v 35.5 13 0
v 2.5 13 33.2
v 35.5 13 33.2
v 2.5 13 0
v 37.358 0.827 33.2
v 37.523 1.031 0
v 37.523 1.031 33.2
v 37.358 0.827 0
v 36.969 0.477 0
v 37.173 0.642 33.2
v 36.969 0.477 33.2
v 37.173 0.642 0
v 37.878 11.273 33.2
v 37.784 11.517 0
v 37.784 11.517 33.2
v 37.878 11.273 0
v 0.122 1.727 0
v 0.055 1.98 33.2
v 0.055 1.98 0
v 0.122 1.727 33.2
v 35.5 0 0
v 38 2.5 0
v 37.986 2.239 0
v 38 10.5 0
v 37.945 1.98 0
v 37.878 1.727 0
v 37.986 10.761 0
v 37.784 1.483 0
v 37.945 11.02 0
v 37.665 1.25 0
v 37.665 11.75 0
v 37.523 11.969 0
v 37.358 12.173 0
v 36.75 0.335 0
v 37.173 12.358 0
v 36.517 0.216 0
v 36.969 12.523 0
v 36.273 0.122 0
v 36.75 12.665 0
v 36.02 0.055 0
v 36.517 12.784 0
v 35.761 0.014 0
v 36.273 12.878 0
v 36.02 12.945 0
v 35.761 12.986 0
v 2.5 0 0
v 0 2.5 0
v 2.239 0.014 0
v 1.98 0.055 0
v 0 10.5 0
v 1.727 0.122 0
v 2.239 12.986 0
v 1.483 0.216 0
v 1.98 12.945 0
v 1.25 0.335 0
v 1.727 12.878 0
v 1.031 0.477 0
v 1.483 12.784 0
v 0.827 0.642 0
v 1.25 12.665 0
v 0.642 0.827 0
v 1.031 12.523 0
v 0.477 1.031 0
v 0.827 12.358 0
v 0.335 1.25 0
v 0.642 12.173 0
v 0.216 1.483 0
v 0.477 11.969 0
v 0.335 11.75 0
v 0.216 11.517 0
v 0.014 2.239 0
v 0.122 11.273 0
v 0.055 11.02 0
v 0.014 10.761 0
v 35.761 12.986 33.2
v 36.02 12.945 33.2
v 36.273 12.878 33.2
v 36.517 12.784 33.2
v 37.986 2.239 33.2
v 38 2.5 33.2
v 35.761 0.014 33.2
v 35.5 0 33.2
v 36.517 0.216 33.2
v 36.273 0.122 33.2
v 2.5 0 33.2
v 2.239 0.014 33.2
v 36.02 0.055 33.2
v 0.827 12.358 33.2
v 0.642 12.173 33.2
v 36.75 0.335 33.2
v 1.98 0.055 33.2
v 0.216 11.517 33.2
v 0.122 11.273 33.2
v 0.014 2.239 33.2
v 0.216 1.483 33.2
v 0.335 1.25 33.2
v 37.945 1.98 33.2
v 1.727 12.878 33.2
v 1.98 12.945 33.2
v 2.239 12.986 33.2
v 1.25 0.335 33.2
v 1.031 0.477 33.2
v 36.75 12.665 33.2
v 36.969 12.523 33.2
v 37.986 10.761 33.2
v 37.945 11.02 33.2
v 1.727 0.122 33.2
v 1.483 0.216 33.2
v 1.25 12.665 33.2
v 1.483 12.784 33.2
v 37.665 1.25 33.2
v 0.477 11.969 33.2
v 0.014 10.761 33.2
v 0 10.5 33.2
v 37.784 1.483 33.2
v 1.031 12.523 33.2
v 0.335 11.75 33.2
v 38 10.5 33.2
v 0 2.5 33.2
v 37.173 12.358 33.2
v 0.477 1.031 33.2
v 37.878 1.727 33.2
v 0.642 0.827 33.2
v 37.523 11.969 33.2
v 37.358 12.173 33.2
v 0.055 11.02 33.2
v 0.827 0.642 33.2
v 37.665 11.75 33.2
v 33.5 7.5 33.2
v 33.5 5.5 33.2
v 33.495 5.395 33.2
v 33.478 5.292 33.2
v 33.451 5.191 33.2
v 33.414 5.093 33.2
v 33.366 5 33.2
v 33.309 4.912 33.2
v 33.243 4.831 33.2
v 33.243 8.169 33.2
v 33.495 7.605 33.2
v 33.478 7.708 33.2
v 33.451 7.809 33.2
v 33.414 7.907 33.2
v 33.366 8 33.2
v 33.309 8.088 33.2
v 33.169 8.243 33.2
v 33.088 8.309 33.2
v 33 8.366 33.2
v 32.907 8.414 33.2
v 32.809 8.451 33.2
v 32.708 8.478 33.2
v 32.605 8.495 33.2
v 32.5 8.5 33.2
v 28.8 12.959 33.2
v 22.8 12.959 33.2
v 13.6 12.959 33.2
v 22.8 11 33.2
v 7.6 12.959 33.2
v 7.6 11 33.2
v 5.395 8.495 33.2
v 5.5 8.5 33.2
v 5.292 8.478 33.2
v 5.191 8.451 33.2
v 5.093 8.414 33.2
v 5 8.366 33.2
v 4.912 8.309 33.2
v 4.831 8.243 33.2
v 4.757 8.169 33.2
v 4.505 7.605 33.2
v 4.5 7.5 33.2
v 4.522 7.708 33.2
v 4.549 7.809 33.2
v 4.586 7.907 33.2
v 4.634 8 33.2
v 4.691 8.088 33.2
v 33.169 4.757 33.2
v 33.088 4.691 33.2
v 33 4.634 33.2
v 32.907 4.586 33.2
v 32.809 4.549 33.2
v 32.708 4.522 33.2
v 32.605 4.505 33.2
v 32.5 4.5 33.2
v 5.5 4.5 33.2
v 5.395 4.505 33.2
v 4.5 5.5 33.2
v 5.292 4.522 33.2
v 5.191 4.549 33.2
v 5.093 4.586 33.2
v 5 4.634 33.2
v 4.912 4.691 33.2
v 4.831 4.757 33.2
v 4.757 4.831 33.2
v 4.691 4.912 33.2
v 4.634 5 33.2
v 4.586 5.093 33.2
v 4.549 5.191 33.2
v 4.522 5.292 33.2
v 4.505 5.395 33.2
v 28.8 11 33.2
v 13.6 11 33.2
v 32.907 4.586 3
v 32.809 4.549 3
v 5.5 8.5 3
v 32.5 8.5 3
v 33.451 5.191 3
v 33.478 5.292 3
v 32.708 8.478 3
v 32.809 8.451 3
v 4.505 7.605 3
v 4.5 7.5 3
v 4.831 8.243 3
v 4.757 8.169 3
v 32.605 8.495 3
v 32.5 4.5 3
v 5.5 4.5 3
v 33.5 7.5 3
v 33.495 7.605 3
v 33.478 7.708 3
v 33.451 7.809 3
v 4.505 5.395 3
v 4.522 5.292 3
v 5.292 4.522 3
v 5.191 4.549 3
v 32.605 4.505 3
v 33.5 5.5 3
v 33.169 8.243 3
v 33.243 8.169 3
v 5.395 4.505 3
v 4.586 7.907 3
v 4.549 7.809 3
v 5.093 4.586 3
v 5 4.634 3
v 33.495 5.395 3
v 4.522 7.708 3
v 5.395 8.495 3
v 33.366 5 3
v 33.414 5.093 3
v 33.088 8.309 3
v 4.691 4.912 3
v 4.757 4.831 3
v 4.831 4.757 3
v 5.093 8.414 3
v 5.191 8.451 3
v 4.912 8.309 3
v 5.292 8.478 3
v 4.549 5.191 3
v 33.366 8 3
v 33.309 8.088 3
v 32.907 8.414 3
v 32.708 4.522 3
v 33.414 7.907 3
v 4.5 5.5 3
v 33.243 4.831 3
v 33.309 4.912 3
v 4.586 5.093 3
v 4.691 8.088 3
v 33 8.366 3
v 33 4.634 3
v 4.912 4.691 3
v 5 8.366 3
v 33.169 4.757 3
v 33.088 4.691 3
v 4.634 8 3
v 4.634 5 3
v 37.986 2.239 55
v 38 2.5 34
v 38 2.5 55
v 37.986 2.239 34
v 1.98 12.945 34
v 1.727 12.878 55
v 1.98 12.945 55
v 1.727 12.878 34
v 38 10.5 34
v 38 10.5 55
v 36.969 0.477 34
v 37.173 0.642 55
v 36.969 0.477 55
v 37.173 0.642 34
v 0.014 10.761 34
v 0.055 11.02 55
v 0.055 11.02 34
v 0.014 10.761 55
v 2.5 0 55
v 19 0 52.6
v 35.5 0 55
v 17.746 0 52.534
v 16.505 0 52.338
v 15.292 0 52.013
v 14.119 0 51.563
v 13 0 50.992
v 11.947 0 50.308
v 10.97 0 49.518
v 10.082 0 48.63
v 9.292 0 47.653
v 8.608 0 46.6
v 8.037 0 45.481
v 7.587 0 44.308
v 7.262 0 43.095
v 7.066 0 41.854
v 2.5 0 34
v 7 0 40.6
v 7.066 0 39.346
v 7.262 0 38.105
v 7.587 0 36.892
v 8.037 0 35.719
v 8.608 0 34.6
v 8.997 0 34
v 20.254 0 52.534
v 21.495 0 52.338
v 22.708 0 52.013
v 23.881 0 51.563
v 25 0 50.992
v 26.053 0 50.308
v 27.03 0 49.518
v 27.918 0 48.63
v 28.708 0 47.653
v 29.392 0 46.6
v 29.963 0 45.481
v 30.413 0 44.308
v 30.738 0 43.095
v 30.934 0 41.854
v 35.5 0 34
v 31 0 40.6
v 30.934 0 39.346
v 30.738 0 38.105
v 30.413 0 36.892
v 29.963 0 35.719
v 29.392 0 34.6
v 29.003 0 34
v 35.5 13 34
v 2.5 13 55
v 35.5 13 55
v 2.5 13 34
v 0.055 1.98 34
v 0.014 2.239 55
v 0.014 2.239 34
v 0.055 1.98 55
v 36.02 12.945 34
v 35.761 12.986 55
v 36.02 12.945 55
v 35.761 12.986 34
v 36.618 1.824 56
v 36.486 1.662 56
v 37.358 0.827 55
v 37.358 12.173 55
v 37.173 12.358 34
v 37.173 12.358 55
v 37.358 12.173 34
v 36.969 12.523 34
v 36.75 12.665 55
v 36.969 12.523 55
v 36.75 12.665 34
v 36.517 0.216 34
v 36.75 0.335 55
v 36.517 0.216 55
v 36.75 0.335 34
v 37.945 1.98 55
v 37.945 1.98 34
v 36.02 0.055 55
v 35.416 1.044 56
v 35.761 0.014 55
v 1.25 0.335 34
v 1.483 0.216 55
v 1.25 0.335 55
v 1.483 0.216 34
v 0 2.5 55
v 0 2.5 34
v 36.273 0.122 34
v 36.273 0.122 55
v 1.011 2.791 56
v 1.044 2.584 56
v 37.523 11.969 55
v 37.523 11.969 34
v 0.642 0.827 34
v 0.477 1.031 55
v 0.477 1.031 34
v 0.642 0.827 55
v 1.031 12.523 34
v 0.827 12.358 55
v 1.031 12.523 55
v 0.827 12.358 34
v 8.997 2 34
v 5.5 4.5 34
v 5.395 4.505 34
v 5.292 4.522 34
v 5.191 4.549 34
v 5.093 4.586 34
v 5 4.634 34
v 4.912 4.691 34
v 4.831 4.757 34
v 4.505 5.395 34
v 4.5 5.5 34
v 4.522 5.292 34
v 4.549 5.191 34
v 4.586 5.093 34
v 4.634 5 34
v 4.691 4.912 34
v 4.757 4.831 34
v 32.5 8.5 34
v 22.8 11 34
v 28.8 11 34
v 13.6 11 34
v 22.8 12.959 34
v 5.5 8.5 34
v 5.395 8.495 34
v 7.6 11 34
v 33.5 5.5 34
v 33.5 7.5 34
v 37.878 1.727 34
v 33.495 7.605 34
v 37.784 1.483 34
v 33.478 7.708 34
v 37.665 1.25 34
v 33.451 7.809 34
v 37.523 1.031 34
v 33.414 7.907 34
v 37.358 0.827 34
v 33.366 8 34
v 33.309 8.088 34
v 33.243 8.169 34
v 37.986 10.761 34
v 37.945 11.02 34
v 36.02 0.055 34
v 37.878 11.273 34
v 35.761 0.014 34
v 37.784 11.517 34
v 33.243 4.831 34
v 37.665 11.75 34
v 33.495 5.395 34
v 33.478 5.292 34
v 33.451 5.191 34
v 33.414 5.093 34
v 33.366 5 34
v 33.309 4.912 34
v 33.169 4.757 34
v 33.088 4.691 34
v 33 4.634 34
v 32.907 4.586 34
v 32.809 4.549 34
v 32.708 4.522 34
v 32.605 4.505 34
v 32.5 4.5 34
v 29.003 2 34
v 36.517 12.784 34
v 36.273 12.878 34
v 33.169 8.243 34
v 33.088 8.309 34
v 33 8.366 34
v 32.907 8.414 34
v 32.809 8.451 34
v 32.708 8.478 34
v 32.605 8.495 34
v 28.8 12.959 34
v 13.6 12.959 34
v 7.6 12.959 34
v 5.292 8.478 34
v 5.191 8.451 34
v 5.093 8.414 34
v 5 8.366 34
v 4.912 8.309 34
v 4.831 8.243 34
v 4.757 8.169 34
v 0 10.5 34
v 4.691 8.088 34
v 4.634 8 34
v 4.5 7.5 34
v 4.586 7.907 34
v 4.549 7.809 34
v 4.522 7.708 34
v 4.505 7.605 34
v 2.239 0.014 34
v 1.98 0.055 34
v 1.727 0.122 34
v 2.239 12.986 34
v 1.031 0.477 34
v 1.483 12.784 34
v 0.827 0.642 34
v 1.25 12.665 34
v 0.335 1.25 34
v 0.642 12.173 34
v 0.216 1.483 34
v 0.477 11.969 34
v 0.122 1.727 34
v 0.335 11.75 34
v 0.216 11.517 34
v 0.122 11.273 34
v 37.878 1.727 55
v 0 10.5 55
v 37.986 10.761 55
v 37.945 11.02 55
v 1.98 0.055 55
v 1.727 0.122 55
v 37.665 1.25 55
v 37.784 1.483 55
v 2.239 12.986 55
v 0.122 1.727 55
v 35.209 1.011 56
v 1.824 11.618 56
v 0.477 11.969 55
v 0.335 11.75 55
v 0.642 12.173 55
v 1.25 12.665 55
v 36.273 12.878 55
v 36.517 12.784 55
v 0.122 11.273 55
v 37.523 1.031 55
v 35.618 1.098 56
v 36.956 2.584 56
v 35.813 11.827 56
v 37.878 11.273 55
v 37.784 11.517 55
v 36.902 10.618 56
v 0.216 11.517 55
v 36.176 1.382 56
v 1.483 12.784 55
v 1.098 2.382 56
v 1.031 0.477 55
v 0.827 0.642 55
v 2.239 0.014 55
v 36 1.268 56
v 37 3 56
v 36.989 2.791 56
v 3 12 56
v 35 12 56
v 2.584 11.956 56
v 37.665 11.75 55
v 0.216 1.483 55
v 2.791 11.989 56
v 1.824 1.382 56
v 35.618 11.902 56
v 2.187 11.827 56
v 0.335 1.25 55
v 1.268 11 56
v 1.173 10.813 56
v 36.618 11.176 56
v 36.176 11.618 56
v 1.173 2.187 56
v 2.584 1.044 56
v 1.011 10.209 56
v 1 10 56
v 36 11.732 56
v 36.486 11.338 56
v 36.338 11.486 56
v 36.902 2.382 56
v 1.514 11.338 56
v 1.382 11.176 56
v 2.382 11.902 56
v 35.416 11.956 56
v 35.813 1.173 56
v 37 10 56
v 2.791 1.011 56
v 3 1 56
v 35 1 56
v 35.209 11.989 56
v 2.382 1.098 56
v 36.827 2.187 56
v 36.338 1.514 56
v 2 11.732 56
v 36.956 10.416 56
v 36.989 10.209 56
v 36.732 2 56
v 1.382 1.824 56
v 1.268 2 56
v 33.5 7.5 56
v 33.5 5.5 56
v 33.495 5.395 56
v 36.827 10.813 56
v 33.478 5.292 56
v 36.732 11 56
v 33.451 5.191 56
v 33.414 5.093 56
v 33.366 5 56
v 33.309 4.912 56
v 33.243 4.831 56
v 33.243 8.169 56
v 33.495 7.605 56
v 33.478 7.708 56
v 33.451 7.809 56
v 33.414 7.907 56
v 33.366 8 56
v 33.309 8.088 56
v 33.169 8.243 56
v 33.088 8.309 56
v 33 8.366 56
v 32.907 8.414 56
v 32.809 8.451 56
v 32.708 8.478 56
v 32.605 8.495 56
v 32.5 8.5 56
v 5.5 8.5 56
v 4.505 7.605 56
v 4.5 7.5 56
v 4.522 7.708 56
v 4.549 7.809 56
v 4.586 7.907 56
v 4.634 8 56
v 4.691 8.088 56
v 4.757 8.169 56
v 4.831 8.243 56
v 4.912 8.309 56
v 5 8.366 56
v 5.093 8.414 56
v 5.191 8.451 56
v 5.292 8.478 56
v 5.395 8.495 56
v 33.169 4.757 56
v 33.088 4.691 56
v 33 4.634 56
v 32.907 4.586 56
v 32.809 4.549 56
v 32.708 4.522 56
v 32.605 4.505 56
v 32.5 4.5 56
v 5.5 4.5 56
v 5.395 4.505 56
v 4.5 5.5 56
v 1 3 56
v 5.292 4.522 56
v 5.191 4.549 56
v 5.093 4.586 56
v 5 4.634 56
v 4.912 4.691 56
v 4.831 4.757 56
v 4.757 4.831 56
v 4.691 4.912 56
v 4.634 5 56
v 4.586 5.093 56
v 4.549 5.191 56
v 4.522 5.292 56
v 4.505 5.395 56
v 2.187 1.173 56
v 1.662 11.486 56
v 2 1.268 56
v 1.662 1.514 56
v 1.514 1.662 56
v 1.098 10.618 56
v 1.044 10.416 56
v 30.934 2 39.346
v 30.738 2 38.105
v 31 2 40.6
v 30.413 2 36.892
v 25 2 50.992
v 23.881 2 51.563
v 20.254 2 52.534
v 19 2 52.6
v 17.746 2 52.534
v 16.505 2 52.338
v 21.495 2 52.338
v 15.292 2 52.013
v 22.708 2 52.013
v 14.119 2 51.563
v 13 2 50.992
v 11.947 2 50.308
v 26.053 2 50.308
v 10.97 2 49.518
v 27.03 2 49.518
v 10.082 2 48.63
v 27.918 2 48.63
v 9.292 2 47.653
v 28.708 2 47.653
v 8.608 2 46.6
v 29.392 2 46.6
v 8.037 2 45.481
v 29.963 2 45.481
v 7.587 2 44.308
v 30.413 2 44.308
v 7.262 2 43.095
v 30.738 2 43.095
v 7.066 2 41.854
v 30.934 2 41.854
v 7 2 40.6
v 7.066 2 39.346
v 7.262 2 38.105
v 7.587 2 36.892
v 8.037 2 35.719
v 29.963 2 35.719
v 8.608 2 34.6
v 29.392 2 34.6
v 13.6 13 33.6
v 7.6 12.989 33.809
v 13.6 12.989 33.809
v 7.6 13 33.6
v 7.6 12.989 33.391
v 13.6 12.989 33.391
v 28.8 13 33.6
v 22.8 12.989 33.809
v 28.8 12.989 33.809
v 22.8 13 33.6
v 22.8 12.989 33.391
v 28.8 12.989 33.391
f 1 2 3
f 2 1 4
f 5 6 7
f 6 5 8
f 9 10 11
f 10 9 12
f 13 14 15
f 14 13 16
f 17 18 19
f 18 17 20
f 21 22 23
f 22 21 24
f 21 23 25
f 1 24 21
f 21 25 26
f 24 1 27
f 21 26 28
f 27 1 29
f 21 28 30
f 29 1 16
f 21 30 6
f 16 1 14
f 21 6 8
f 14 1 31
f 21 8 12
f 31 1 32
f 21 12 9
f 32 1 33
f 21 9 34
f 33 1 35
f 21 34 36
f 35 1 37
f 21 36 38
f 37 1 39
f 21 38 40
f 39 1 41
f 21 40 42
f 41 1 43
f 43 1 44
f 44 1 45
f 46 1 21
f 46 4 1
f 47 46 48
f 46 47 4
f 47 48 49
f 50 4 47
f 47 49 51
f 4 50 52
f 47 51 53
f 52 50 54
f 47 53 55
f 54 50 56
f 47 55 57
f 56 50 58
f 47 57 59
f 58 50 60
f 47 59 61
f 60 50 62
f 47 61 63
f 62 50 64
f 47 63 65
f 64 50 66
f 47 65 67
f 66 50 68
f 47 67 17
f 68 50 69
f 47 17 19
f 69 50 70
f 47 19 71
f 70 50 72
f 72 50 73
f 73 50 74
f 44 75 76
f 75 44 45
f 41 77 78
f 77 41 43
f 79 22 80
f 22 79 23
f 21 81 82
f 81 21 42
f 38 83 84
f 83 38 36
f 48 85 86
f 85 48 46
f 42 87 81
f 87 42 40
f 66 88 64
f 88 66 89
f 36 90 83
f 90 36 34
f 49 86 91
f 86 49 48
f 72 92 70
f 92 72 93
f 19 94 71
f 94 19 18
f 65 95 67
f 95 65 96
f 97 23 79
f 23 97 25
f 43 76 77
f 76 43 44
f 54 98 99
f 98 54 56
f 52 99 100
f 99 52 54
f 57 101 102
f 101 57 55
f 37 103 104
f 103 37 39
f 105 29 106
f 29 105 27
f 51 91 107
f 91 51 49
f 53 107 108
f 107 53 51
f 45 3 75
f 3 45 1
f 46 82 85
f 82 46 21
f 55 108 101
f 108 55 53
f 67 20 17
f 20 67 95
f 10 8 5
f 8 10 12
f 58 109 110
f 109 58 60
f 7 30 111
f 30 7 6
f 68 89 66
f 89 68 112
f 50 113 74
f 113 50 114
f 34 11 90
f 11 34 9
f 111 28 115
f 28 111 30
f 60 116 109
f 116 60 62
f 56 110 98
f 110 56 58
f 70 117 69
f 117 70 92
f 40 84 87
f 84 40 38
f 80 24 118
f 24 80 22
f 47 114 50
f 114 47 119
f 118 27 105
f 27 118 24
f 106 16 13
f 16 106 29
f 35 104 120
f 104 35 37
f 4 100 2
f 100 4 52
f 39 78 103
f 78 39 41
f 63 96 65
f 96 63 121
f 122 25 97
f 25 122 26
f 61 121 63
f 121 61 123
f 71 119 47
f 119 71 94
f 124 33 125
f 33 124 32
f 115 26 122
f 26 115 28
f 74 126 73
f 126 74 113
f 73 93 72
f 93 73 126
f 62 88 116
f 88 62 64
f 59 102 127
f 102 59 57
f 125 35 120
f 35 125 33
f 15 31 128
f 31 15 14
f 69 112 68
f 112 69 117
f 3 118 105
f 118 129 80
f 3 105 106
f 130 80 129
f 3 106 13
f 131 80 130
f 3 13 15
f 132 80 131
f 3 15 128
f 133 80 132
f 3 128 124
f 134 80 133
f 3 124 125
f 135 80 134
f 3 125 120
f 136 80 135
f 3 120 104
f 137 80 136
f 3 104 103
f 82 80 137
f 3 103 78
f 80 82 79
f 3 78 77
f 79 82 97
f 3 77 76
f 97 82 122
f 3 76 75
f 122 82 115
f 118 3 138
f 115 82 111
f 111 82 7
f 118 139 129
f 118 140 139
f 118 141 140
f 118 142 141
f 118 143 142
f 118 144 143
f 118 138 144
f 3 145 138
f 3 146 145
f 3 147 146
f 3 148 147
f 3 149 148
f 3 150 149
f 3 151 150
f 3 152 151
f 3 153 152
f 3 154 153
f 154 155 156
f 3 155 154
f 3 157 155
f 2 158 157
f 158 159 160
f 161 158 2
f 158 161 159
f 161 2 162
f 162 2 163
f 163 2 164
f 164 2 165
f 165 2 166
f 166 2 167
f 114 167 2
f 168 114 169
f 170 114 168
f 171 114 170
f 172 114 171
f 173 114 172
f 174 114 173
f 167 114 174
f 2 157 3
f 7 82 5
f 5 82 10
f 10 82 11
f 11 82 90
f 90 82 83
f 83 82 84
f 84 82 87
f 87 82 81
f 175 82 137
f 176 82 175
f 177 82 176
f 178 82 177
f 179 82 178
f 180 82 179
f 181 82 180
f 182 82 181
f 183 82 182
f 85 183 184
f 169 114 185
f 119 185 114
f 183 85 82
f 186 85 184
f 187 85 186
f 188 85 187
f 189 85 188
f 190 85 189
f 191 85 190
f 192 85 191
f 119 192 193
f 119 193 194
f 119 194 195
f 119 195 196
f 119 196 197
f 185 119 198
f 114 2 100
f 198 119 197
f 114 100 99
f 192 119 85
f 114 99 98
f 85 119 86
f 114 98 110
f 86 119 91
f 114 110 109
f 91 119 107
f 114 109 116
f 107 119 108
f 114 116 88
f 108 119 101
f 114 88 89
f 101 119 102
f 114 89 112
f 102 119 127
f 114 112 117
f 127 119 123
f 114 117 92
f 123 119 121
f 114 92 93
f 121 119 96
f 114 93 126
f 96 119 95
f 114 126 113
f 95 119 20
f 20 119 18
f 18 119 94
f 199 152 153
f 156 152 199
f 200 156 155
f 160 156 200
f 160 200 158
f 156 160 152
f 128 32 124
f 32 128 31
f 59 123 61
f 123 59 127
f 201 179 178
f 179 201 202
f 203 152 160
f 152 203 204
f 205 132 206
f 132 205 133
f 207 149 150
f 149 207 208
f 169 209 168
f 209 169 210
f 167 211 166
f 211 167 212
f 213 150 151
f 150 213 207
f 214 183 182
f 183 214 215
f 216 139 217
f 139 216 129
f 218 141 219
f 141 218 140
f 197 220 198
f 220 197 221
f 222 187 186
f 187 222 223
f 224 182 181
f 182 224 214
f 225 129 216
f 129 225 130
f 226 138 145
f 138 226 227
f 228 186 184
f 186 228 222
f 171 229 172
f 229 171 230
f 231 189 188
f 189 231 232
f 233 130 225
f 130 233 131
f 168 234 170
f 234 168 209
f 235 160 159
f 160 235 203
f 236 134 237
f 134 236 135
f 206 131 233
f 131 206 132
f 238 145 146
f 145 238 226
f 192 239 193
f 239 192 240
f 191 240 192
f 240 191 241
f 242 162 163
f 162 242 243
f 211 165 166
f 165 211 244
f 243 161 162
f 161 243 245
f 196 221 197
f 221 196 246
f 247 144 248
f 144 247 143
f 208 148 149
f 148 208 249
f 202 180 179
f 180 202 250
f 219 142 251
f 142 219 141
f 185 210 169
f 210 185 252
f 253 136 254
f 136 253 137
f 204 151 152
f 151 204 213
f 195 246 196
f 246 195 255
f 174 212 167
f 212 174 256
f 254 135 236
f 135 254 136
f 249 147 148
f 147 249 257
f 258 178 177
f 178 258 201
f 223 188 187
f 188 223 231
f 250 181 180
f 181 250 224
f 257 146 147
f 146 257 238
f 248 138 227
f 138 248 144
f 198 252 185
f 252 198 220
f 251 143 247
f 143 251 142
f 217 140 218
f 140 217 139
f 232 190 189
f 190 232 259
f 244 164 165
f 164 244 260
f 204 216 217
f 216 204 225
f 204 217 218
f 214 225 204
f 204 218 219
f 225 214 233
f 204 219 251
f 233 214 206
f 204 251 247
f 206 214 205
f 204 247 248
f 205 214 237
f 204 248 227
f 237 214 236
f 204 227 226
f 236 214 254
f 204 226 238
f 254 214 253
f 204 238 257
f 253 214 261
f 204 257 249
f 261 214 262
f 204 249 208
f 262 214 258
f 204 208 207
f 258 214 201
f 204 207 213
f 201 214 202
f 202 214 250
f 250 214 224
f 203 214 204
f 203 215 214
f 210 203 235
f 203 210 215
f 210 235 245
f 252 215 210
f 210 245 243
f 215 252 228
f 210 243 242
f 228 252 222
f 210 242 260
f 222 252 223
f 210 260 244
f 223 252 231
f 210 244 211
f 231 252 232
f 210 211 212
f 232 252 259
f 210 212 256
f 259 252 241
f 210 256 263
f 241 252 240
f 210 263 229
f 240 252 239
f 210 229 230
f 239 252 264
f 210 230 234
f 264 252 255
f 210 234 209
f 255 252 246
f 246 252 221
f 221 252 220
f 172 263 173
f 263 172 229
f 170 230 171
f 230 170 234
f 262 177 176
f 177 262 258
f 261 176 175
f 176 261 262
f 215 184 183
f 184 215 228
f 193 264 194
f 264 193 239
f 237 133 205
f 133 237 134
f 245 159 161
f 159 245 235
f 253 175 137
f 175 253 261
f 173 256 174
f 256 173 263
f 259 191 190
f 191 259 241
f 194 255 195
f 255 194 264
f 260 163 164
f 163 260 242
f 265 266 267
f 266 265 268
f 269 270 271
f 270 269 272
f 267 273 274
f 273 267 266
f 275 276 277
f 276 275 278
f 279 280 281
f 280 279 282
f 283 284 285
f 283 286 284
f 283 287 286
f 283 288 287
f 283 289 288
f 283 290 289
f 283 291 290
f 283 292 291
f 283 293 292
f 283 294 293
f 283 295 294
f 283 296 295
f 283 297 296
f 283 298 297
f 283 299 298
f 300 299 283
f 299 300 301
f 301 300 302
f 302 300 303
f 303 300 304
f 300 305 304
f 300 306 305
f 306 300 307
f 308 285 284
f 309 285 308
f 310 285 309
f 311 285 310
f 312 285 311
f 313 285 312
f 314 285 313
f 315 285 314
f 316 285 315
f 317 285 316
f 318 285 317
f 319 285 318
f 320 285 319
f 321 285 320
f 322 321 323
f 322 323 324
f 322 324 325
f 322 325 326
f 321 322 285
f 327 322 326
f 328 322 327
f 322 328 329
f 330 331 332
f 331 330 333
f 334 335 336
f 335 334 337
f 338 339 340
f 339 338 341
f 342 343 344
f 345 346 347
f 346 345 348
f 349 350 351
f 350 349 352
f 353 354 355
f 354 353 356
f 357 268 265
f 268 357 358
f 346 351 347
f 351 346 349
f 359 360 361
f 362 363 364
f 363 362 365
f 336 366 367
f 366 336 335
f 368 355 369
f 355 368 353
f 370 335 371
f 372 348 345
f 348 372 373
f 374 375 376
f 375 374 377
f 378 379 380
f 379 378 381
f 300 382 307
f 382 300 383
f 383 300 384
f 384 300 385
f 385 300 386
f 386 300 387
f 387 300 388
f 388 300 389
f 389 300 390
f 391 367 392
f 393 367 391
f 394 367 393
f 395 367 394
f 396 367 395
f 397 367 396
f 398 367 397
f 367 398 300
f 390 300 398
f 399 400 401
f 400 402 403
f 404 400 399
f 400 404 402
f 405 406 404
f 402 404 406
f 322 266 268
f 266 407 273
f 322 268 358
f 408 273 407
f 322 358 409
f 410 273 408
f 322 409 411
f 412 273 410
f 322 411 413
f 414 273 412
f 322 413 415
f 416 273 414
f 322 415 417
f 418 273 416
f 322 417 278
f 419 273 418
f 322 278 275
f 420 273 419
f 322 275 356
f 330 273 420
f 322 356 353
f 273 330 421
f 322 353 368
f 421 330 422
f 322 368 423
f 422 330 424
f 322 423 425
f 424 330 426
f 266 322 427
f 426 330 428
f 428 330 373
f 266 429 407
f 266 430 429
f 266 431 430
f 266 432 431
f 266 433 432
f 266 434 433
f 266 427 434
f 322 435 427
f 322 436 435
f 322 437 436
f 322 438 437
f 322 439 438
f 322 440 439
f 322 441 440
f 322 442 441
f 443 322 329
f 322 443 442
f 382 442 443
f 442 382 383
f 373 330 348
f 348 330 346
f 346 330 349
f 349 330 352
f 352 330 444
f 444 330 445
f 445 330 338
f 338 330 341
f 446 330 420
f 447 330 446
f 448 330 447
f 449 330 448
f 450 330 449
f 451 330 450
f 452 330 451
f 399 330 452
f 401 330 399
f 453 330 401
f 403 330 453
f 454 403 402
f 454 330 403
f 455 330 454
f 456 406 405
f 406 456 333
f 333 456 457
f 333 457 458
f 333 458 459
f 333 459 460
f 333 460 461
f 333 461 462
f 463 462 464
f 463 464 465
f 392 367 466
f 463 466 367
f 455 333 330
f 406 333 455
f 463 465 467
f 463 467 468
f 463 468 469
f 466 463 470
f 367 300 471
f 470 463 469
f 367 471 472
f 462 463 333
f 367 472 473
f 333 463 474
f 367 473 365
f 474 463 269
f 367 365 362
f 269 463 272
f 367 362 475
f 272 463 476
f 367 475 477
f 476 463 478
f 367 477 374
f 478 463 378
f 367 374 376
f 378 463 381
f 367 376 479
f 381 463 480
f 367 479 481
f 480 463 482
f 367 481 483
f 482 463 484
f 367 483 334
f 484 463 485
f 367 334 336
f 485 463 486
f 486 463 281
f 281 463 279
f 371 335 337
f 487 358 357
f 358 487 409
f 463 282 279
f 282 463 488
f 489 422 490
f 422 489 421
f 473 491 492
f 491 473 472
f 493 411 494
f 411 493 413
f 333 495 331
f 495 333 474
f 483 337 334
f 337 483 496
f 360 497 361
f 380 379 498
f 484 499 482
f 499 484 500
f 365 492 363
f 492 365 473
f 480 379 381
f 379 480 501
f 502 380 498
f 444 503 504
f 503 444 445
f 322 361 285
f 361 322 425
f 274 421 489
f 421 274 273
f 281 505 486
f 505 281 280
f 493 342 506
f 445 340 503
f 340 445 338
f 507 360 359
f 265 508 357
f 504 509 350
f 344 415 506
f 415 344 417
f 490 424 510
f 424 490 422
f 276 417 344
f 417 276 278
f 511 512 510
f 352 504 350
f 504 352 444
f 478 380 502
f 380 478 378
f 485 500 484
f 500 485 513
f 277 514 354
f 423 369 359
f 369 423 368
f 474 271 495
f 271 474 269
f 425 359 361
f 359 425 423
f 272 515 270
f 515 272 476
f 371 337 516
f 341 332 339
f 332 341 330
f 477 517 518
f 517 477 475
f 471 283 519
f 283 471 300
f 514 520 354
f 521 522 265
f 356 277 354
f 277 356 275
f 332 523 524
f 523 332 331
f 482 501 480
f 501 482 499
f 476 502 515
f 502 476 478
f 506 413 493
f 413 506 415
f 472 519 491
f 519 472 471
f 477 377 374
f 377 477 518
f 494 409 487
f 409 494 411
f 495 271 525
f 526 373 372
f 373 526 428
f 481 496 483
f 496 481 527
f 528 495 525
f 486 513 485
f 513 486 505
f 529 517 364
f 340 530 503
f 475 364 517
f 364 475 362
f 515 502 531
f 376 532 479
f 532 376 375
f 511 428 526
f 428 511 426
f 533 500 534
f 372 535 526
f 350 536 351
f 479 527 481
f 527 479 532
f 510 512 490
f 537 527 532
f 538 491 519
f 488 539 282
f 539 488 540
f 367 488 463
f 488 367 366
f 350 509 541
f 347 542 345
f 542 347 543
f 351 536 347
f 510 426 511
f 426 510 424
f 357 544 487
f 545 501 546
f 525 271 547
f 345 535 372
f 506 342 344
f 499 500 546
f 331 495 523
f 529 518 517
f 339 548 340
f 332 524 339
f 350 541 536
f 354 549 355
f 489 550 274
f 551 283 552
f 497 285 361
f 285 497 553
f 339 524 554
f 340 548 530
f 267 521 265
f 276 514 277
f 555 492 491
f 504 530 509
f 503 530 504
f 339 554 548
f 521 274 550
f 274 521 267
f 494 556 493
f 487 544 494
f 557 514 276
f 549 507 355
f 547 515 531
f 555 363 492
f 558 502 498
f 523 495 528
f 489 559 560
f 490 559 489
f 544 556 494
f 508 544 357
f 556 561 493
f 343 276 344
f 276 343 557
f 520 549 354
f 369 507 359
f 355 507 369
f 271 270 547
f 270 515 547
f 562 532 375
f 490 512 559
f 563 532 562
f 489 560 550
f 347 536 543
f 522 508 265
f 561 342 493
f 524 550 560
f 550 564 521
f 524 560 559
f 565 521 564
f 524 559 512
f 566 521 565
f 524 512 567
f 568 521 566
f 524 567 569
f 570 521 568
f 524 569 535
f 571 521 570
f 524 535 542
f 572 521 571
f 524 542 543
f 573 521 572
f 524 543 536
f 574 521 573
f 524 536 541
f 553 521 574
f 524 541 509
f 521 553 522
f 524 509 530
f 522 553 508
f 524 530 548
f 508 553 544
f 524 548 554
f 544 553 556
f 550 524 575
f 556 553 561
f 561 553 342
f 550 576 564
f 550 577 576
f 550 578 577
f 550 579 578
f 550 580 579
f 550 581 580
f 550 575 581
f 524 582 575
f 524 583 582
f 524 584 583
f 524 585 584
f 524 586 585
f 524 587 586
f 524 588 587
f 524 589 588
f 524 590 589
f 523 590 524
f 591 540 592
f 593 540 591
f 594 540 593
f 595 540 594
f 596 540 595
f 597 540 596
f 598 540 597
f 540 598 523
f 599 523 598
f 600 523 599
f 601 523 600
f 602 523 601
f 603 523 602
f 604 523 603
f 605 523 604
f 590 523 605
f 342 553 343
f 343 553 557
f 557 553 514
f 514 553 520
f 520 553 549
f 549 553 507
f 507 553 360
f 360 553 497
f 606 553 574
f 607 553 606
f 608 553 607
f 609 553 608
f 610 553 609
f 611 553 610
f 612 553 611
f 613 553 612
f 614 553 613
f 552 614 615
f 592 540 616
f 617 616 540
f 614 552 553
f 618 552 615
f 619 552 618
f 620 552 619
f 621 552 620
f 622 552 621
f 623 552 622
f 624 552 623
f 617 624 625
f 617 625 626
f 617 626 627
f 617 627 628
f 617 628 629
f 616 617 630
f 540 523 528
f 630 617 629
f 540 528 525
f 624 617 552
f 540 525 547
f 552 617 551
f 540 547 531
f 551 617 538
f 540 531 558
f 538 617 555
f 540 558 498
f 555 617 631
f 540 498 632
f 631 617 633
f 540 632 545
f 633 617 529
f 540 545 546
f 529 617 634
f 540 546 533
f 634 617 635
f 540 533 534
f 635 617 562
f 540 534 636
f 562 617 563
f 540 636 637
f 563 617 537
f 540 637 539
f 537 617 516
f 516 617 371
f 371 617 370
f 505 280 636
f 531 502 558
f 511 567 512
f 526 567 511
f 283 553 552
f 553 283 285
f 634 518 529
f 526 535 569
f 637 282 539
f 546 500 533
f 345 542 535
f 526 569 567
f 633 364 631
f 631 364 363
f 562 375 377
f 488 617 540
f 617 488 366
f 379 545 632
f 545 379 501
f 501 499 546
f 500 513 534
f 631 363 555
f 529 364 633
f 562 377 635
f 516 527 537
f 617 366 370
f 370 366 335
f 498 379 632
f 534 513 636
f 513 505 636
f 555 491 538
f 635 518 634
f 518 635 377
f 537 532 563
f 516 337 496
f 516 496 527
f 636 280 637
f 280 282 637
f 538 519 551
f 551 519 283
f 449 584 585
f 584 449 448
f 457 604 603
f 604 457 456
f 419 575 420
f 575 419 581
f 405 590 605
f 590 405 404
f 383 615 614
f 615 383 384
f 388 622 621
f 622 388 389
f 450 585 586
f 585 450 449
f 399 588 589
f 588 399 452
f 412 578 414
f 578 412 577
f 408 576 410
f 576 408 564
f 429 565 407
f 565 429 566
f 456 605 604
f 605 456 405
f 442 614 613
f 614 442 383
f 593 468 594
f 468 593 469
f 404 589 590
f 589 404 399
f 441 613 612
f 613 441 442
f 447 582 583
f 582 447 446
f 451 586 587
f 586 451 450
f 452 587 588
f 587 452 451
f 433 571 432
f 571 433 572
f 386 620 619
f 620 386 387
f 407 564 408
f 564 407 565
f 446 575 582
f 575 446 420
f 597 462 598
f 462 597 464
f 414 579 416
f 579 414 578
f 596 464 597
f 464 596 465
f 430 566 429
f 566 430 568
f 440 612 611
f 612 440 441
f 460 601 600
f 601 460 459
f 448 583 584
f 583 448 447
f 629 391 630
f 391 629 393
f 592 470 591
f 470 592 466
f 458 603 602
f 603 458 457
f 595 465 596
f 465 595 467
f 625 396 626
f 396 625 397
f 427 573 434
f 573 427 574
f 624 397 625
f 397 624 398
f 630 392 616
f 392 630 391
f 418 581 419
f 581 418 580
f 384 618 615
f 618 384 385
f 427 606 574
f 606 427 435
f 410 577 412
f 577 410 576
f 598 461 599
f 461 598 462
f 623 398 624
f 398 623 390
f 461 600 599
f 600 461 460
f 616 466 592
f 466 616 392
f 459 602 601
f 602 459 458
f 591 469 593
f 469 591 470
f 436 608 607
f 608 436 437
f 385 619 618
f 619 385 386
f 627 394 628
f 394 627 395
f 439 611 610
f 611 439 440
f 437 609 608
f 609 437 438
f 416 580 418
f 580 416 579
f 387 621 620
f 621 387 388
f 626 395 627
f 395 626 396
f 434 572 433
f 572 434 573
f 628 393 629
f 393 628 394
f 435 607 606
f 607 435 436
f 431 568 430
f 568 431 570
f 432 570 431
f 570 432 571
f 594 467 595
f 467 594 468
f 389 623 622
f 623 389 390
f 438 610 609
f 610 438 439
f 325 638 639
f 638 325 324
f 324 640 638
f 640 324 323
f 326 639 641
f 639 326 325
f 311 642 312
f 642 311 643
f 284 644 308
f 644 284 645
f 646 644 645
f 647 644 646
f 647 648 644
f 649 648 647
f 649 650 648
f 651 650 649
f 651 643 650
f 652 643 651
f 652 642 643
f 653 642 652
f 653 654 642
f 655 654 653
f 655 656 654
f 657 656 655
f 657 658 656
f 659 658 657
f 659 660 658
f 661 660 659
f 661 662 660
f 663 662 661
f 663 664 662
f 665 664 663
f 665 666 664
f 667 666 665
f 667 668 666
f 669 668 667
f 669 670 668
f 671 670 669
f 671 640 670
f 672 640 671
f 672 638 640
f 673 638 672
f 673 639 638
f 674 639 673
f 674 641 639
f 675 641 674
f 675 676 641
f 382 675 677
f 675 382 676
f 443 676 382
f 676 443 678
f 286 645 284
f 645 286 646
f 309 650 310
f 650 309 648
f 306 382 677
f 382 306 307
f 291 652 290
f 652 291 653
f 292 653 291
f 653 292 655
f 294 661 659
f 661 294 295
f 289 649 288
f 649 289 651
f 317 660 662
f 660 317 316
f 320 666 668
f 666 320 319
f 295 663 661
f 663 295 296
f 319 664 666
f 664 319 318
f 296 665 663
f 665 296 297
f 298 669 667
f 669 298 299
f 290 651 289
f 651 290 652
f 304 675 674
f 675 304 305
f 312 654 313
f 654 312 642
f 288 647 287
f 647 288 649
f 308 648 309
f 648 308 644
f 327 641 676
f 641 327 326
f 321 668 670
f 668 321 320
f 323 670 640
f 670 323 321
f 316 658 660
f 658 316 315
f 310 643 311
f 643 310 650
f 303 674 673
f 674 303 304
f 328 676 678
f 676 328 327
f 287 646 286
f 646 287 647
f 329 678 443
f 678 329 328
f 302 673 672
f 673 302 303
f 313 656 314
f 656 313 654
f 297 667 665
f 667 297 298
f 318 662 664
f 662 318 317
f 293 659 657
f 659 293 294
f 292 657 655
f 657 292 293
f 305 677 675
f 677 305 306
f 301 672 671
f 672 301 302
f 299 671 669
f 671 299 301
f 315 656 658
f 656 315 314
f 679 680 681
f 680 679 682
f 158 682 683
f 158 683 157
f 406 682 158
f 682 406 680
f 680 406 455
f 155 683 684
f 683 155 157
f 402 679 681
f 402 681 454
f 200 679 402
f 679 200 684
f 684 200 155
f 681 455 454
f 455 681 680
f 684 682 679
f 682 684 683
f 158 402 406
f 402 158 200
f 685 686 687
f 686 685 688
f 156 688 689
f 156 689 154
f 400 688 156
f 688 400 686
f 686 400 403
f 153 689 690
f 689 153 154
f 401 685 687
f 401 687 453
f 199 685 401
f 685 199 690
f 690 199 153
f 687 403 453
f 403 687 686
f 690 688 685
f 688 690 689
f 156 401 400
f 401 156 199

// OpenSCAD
// Simple Zippo Lighter
// Classic American windproof lighter with flip-top lid
// Real dimensions: 56mm x 38mm x 13mm (height x width x depth)
// Shown in closed position (iconic state)

$fn = 60;
wall_thickness = 1.5;  // Thinner walls for more realistic look

// Correct Zippo dimensions
lighter_height = 56;
lighter_width = 38;
lighter_depth = 13;
corner_radius = 2.5;
lid_height = 22;  // About 40% of height
gap = 0.8;  // Visible gap between lid and body

// Main body (bottom part)
module lighter_body() {
    difference() {
        // Outer shell with rounded corners
        hull() {
            for (x = [corner_radius, lighter_width - corner_radius])
                for (y = [corner_radius, lighter_depth - corner_radius])
                    translate([x, y, 0])
                        cylinder(r = corner_radius, h = lighter_height - lid_height - gap);
        }
        
        // Hollow interior (less aggressive for strength)
        translate([wall_thickness*2, wall_thickness*2, wall_thickness*2])
            hull() {
                for (x = [corner_radius, lighter_width - corner_radius - 4*wall_thickness])
                    for (y = [corner_radius, lighter_depth - corner_radius - 4*wall_thickness])
                        translate([x, y, 0])
                            cylinder(r = corner_radius - wall_thickness, h = lighter_height);
            }
    }
}

// Lid (top part) - closed position with subtle bevel
module lighter_lid() {
    translate([0, 0, lighter_height - lid_height]) {
        difference() {
            // Outer shell with slight taper at top
            hull() {
                // Bottom of lid
                for (x = [corner_radius, lighter_width - corner_radius])
                    for (y = [corner_radius, lighter_depth - corner_radius])
                        translate([x, y, 0])
                            cylinder(r = corner_radius, h = lid_height - 1);
                // Top of lid (slightly smaller for bevel effect)
                for (x = [corner_radius + 0.5, lighter_width - corner_radius - 0.5])
                    for (y = [corner_radius + 0.5, lighter_depth - corner_radius - 0.5])
                        translate([x, y, lid_height - 1])
                            cylinder(r = corner_radius - 0.5, h = 1);
            }
            
            // Hollow interior
            translate([wall_thickness*2, wall_thickness*2, -1])
                hull() {
                    for (x = [corner_radius, lighter_width - corner_radius - 4*wall_thickness])
                        for (y = [corner_radius, lighter_depth - corner_radius - 4*wall_thickness])
                            translate([x, y, 0])
                                cylinder(r = corner_radius - wall_thickness, h = lid_height + 2);
                }
            
            // Thumb indent for opening
            translate([lighter_width/2, -1, lid_height * 0.3])
                rotate([-90, 0, 0])
                    cylinder(r = 12, h = 3);
        }
    }
}

// Integrated hinge detail (flush with back)
module hinge() {
    hinge_pos = lighter_height - lid_height - gap/2;
    
    // Hinge barrels integrated into back edge
    color("DarkGray") {
        // Left hinge barrel
        translate([lighter_width * 0.2, lighter_depth - 2, hinge_pos])
            difference() {
                rotate([0, 90, 0])
                    cylinder(r = 2, h = 6);
                translate([-1, -3, -3])
                    cube([8, 3, 6]);
            }
        
        // Right hinge barrel
        translate([lighter_width * 0.6, lighter_depth - 2, hinge_pos])
            difference() {
                rotate([0, 90, 0])
                    cylinder(r = 2, h = 6);
                translate([-1, -3, -3])
                    cube([8, 3, 6]);
            }
    }
}

// Assembly
color("Silver") {
    lighter_body();
    lighter_lid();
}
hinge();
